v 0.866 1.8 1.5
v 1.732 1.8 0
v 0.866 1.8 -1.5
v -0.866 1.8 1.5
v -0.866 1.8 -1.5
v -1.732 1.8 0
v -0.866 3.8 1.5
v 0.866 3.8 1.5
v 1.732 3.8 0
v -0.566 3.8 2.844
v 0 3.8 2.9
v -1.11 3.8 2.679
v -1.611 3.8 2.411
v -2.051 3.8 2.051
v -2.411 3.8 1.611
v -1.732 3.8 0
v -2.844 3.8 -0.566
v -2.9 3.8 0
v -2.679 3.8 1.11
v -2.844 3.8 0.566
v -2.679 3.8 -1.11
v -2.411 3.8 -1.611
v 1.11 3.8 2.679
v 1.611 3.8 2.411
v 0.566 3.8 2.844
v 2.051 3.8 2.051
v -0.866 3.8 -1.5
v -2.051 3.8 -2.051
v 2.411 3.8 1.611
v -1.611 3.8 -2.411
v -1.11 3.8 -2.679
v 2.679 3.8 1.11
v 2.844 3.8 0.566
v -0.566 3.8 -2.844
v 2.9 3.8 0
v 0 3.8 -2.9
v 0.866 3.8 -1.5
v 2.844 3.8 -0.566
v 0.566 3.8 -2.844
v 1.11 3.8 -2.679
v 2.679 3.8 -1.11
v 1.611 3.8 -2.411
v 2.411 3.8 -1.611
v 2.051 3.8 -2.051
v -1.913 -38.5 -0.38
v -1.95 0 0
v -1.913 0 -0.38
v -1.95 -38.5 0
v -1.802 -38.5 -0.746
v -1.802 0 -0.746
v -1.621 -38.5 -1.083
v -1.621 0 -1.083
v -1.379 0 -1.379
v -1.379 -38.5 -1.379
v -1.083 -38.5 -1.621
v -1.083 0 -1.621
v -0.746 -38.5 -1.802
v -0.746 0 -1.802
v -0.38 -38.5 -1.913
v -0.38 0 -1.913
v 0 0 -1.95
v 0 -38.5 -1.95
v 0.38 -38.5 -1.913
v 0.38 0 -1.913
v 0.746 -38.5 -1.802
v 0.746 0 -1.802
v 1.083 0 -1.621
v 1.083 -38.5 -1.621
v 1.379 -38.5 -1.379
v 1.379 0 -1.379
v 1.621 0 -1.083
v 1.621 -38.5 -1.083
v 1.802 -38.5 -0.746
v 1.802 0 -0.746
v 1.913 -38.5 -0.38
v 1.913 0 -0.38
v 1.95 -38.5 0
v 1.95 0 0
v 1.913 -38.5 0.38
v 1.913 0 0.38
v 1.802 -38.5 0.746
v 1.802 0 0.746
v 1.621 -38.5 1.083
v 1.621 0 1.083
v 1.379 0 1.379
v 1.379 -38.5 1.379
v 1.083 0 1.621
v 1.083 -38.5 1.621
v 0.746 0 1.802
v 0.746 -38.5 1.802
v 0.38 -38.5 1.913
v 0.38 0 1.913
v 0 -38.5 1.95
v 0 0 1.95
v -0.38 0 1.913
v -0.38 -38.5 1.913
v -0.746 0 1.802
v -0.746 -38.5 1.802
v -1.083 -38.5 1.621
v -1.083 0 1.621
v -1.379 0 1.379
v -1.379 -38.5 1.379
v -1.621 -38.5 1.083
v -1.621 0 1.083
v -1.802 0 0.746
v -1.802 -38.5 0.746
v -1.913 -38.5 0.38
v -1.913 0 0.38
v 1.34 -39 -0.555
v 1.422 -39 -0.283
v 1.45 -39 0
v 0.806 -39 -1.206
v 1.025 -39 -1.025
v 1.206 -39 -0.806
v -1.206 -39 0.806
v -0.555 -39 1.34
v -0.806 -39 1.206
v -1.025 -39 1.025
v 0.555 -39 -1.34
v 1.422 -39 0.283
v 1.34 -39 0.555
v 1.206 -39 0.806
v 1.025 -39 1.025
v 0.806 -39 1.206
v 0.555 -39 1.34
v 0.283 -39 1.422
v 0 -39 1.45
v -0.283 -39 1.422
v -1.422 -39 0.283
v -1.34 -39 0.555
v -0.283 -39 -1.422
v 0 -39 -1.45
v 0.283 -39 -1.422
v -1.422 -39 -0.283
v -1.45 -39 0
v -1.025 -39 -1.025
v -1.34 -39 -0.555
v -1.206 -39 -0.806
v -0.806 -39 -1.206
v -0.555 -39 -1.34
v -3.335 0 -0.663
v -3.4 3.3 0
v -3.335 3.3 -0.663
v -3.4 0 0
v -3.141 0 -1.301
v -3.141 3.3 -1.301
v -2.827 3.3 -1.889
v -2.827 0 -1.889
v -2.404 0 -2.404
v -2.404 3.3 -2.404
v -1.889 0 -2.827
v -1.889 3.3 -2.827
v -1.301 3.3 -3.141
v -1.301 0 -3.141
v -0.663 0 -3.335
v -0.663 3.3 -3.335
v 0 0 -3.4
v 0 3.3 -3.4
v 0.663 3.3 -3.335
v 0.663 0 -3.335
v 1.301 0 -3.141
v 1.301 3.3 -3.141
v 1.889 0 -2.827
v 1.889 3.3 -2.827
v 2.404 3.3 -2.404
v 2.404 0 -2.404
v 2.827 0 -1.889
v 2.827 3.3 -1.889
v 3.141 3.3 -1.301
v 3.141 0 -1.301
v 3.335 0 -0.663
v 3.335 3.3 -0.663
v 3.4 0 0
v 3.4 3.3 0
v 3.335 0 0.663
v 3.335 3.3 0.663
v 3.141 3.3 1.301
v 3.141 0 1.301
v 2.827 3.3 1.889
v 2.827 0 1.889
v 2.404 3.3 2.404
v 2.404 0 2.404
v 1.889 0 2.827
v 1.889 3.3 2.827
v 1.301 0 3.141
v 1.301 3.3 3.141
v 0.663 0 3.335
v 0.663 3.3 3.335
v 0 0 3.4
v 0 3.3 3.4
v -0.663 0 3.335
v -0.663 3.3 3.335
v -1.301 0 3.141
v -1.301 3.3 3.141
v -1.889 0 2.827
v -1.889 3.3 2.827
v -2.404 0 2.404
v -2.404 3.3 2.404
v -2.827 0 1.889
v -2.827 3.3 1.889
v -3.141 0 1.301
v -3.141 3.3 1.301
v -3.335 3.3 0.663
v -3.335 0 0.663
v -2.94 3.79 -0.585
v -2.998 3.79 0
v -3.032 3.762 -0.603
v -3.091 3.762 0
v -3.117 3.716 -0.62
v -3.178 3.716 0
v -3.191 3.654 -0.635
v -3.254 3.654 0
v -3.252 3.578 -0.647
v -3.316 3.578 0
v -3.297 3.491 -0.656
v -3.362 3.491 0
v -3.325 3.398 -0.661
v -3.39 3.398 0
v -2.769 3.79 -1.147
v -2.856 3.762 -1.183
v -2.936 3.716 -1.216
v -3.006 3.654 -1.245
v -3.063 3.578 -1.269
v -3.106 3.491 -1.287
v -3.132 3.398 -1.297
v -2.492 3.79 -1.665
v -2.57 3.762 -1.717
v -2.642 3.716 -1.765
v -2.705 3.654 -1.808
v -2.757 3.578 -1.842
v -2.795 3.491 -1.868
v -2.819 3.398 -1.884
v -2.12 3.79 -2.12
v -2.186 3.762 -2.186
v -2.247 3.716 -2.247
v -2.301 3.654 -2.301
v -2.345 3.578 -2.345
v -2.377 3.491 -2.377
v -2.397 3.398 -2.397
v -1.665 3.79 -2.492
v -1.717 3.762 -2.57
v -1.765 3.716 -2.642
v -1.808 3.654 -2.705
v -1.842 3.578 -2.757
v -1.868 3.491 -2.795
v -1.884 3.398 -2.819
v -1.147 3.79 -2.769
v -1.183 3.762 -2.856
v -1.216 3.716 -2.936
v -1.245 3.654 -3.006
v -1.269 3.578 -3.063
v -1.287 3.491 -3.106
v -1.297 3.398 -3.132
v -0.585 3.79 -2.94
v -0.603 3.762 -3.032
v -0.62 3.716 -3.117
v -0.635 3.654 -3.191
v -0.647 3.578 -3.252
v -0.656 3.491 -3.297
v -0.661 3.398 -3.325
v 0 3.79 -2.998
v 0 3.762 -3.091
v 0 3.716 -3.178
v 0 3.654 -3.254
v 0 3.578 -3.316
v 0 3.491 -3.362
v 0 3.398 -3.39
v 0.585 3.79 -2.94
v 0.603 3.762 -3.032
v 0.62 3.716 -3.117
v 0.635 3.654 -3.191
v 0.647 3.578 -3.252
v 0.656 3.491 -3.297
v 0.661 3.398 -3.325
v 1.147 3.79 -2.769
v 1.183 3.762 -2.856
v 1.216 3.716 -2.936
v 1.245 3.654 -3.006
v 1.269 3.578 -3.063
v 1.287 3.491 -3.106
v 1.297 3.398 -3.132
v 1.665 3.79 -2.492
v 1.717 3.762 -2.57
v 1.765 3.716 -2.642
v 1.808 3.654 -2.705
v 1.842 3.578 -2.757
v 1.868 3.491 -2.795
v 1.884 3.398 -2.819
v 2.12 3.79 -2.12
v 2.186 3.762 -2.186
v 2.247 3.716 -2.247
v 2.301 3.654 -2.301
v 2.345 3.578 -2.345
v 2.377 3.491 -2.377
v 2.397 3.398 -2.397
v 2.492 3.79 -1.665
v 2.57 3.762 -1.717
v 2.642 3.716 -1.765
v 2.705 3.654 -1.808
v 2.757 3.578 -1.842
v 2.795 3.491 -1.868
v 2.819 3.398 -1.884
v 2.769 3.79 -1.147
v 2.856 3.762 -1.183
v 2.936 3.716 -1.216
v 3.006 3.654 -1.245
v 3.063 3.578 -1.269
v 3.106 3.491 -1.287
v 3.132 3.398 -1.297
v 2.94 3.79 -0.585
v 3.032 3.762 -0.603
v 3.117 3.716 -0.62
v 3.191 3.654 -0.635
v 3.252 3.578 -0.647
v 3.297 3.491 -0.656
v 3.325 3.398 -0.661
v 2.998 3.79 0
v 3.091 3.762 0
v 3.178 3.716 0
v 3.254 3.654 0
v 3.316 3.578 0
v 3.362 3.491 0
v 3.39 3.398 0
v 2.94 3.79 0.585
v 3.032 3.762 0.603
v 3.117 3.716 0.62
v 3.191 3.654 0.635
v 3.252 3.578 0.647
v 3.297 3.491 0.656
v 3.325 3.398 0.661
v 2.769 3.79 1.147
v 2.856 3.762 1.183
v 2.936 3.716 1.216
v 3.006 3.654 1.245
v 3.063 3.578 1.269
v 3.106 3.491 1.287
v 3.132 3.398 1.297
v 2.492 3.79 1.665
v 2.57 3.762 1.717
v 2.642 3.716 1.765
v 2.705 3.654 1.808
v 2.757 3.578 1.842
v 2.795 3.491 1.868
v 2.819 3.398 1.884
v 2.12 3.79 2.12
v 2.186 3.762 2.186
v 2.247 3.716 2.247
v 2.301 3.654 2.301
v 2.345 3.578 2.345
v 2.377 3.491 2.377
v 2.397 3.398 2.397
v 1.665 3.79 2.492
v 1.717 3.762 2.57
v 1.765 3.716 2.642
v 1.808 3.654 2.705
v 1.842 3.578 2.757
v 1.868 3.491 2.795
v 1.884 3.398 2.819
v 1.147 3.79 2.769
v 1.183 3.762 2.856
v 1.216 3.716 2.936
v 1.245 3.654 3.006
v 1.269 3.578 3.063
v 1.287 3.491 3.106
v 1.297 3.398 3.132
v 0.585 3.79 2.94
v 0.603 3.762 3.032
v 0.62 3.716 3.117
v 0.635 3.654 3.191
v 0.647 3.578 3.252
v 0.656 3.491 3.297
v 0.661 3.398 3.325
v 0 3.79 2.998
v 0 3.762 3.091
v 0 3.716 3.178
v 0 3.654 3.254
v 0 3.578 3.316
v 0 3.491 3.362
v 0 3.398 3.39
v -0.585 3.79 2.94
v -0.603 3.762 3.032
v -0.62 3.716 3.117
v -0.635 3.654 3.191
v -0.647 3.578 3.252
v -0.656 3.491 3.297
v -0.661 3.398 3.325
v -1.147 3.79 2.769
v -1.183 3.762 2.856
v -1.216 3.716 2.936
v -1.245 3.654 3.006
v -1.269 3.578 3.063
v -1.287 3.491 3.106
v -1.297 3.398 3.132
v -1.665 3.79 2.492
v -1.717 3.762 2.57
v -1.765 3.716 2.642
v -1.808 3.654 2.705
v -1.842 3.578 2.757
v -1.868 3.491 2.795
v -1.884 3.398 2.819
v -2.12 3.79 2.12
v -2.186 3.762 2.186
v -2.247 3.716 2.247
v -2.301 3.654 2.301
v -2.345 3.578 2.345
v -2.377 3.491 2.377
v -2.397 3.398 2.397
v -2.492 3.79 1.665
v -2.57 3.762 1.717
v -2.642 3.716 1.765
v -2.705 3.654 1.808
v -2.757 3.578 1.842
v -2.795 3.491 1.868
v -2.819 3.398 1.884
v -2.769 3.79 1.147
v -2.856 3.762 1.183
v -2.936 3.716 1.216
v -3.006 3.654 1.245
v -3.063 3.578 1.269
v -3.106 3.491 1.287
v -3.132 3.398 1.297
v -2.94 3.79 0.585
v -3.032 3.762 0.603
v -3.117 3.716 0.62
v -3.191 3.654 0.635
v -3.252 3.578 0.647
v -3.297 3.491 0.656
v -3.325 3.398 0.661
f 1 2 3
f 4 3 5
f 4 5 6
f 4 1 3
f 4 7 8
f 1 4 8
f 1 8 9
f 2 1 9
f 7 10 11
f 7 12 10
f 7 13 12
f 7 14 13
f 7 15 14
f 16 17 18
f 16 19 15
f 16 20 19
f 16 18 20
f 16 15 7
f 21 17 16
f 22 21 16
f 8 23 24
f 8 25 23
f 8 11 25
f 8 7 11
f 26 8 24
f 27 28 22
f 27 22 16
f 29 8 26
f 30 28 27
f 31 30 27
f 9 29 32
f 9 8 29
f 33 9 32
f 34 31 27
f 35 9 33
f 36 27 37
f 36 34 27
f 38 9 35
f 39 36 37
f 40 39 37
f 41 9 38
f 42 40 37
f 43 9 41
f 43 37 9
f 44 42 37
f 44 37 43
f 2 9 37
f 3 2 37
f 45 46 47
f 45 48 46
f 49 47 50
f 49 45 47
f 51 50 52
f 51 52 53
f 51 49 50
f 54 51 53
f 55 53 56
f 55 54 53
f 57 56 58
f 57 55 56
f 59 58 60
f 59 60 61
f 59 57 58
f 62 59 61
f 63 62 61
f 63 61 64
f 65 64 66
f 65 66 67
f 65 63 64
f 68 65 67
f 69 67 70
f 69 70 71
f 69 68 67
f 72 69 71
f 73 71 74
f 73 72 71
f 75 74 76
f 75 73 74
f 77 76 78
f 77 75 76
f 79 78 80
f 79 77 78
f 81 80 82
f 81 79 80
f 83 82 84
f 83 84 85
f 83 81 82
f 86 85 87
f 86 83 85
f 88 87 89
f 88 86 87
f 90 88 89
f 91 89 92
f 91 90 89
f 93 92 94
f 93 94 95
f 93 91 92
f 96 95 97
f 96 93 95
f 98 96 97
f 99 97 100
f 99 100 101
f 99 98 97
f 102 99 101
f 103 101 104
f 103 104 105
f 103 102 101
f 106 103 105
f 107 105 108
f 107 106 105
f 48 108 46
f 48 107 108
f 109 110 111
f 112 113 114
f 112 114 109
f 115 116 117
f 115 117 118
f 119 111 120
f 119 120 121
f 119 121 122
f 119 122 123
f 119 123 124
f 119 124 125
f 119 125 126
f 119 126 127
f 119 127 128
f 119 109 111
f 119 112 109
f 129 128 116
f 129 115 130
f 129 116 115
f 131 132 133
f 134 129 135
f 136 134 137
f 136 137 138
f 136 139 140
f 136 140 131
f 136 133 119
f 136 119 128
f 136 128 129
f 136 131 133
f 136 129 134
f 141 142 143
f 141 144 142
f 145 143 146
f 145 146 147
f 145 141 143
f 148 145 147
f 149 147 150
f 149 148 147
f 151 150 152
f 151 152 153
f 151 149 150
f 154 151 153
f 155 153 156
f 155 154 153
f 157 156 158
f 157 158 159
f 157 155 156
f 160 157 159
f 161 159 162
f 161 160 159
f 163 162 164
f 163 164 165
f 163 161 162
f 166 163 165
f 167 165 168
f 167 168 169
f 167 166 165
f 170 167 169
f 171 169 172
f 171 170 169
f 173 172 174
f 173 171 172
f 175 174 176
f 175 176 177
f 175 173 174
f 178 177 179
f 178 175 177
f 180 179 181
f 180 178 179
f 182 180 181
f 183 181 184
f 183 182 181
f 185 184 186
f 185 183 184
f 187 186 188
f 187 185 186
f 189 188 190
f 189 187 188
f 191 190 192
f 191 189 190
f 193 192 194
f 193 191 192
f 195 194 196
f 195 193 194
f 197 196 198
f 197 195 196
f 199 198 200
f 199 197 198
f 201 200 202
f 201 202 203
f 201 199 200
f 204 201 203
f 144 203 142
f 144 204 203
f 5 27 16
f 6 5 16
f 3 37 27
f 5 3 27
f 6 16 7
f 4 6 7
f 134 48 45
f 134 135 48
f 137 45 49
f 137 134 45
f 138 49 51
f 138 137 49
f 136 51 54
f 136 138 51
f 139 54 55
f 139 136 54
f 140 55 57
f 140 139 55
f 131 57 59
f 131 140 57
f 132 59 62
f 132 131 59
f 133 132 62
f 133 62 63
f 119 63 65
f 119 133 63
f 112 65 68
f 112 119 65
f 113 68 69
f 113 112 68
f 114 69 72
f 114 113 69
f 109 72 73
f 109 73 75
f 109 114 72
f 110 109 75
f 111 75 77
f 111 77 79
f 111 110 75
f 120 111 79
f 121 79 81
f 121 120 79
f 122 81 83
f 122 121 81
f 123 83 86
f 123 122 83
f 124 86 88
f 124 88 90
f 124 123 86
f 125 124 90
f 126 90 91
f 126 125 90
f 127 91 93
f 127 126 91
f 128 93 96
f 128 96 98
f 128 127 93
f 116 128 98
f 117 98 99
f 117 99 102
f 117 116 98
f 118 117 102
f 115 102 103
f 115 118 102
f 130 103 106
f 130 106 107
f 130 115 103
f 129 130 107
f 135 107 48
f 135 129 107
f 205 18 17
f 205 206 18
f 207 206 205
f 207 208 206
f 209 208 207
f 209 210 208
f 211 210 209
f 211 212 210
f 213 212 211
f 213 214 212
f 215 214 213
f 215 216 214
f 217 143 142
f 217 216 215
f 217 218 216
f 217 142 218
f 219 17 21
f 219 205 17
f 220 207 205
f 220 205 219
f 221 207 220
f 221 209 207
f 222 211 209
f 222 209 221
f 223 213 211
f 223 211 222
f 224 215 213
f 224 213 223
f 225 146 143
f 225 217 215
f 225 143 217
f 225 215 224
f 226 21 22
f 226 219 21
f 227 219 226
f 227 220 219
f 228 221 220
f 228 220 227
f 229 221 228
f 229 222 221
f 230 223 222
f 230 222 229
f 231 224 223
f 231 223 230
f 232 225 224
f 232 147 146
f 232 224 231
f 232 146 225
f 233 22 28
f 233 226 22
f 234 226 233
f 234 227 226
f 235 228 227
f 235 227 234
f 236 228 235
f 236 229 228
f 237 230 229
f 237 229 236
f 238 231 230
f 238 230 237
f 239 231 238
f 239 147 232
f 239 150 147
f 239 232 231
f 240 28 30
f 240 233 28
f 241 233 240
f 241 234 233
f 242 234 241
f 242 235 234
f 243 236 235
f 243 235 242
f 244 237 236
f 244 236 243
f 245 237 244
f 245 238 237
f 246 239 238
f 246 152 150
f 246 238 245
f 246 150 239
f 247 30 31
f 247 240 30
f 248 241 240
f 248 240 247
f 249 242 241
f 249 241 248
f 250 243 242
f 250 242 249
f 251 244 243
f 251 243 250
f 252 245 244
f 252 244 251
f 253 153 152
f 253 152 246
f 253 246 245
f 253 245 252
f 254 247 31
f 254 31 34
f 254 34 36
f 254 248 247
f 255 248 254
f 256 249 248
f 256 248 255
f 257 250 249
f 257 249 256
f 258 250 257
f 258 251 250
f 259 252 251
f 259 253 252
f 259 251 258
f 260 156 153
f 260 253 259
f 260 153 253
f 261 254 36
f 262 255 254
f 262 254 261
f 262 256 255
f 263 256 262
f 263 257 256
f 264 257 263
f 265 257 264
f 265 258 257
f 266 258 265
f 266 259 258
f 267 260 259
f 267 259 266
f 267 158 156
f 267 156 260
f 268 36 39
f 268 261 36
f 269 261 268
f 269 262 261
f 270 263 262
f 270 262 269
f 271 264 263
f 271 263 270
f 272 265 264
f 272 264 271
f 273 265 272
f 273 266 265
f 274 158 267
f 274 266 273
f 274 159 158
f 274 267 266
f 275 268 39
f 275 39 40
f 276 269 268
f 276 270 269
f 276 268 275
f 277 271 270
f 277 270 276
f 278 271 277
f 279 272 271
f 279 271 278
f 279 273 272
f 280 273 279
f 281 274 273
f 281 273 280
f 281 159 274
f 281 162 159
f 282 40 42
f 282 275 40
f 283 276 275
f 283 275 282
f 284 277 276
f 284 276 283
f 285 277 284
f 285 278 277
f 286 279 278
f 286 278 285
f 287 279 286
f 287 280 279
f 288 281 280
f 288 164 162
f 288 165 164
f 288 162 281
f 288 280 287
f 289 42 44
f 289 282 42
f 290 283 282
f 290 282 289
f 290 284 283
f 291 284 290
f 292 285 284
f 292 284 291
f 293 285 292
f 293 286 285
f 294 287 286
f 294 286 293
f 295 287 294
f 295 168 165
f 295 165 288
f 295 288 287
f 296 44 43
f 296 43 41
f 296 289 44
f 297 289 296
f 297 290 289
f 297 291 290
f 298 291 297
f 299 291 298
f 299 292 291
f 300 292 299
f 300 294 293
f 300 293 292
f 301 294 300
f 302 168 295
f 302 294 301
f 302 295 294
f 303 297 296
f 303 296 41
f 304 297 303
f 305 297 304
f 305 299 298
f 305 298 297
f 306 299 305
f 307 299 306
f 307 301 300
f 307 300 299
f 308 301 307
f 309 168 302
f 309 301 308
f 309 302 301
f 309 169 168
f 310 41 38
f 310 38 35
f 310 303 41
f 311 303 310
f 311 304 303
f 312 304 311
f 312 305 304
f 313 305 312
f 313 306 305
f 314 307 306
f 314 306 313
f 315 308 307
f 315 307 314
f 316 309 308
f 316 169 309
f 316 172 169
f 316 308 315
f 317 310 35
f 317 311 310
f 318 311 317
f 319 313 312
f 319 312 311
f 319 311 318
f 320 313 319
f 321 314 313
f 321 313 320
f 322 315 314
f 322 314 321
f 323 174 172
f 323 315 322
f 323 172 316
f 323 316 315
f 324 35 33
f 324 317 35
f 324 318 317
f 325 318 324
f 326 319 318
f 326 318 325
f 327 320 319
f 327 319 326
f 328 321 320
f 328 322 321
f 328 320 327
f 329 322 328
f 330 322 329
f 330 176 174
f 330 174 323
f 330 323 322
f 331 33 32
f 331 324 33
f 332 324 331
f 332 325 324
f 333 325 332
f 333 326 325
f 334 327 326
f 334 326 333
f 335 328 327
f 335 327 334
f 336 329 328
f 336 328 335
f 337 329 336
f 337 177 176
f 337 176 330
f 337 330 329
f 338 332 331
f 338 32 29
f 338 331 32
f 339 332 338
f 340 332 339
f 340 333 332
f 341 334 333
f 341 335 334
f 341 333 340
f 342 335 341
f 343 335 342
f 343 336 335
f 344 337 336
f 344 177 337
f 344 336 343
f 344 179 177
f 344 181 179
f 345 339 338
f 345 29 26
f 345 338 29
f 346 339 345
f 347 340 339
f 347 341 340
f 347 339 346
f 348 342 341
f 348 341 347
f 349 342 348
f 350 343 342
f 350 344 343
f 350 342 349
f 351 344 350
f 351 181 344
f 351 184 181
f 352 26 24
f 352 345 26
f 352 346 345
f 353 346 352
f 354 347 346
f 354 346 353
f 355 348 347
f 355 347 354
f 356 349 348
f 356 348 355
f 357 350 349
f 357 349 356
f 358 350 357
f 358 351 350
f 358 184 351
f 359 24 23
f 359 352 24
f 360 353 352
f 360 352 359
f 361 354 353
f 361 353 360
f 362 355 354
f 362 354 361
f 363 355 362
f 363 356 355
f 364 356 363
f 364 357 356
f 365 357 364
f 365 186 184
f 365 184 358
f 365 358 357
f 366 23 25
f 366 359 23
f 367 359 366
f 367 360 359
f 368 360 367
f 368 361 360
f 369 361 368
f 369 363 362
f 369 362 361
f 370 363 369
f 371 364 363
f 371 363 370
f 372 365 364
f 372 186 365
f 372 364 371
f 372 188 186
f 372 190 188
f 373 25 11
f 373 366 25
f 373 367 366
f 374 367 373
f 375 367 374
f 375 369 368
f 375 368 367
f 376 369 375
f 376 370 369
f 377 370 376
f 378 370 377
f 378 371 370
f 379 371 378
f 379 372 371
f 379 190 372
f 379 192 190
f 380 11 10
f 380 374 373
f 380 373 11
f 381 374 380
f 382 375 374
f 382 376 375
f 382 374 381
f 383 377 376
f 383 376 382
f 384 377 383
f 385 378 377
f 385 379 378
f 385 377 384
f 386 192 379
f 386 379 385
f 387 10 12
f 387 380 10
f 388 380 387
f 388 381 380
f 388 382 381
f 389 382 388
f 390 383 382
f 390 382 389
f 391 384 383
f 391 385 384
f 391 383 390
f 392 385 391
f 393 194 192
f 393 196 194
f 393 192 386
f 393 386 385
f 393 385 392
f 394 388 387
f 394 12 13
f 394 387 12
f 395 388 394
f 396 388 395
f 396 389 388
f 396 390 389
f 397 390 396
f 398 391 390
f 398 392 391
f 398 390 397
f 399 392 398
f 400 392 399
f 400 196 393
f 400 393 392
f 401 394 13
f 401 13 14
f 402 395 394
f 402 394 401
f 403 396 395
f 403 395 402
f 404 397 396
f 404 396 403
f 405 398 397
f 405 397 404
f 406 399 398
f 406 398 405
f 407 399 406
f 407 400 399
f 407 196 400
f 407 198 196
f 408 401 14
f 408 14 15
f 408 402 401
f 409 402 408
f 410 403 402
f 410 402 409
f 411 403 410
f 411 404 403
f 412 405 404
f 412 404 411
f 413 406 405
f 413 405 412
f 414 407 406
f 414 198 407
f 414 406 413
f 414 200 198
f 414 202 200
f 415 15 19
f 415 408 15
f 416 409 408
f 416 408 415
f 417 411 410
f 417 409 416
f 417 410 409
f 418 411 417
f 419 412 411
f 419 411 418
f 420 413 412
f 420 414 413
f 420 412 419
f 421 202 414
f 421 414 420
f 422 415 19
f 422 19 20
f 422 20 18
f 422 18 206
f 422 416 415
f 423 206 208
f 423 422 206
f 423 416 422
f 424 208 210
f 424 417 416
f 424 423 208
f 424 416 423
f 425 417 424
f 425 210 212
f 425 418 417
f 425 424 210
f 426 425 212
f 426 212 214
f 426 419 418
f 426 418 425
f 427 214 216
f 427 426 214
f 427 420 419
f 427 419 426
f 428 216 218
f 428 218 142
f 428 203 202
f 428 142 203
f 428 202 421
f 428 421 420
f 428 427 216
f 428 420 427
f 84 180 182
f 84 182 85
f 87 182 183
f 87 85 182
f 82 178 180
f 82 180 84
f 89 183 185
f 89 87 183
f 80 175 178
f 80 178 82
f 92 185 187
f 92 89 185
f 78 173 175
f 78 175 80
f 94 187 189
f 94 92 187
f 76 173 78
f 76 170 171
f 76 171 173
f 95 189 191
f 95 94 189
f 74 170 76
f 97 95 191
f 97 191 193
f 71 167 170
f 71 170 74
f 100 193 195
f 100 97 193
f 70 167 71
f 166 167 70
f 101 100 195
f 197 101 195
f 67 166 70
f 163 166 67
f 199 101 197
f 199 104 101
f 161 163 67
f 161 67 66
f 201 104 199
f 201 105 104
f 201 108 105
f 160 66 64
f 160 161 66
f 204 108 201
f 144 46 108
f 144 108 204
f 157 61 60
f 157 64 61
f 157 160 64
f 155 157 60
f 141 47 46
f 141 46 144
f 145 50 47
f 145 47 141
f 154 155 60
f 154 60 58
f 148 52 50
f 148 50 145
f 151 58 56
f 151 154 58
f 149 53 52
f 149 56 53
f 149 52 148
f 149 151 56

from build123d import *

# Parameters (mm, degrees)
ENL_V_MAT_EXTRU_1_DEPTH = 2


with BuildPart() as part:
    # Esquisse1 → Révolution1 (revolve)
    with BuildSketch(Plane.XY):
        with BuildLine():
            Line((0, 3.8), (-2.9, 3.8))
            ThreePointArc((-2.9, 3.8), (-3.253553391, 3.653553391), (-3.4, 3.3))
            Line((-3.4, 3.3), (-3.4, 0))
            Line((-3.4, 0), (-1.95, 0))
            Line((-1.95, 0), (-1.95, -38.5))
            Line((-1.95, -38.5), (-1.45, -39))
            Line((-1.45, -39), (0, -39))
            Line((0, -39), (0, 3.8))
        make_face()
    revolve(axis=Axis((0, 3.8, 0), (0, -1, 0)))

    # Esquisse2 → Enlèv. mat.-Extru.1 (cut)
    with BuildSketch(Plane(origin=(0, 3.8, 0), x_dir=(-1, 0, 0), z_dir=(0, 1, 0))):
        Polygon((-1.732050808, 0), (-0.866025404, -1.5), (0.866025404, -1.5), (1.732050808, 0), (0.866025404, 1.5), (-0.866025404, 1.5), align=None)
    extrude(amount=-ENL_V_MAT_EXTRU_1_DEPTH, mode=Mode.SUBTRACT)


solid = part.part
